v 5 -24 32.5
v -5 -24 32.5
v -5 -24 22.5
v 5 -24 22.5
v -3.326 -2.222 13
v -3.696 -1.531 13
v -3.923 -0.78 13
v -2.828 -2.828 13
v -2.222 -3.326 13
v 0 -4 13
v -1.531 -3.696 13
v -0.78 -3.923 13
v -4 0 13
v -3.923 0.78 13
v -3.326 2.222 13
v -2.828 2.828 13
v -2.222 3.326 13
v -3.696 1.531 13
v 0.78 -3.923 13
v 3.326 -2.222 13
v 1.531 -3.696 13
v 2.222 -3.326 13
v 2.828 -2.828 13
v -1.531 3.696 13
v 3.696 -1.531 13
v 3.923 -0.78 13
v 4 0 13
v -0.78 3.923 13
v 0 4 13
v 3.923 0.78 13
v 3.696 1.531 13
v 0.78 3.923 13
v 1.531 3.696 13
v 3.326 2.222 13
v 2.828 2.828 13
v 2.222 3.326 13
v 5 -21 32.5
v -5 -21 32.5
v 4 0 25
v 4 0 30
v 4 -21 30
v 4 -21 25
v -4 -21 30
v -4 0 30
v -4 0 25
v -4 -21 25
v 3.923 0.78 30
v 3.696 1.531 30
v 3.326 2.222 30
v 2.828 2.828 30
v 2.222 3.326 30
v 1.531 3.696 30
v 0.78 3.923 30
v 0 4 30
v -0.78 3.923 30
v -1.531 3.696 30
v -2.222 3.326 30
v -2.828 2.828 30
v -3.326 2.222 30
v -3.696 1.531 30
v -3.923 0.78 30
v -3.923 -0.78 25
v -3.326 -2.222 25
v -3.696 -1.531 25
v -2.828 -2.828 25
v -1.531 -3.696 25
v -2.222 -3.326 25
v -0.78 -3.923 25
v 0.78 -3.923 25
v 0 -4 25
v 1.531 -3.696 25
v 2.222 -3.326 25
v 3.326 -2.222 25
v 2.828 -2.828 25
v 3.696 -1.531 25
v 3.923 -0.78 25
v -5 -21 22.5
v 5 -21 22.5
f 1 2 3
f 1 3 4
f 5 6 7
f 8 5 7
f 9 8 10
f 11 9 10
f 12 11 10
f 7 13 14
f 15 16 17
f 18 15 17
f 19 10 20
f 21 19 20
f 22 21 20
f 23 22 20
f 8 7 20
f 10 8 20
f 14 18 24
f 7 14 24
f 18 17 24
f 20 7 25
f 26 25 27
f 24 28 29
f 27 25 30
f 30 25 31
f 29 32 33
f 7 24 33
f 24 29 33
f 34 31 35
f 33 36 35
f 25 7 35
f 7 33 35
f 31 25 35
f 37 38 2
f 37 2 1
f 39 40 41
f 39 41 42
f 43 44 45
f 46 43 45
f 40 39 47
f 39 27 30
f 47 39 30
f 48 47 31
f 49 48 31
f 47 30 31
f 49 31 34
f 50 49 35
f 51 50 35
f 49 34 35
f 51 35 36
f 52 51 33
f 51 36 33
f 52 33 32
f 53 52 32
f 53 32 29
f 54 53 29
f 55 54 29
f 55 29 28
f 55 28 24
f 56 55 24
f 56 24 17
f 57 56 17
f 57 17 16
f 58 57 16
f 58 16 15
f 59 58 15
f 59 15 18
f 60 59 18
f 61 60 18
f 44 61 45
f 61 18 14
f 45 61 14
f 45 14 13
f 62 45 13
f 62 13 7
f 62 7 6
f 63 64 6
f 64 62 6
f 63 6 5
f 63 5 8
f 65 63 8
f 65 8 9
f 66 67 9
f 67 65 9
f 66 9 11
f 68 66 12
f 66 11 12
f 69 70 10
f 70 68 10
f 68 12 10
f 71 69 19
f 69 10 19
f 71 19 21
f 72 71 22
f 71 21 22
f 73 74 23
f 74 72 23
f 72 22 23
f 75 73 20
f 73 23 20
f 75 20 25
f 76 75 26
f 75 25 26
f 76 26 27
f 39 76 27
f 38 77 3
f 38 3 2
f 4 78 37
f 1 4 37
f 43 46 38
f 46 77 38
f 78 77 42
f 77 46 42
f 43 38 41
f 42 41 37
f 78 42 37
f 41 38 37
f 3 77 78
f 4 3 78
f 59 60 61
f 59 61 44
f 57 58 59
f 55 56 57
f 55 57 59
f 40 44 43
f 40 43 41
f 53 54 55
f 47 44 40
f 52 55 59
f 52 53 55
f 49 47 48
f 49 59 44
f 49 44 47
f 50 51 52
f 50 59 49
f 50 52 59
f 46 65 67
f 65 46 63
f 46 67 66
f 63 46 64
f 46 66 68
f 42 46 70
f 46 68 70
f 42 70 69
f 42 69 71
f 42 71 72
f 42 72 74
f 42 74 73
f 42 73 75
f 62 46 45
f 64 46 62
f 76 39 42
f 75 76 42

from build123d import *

# Parameters (mm, degrees)
BOSS_EXTRUDE1_START = 13
SKETCH1_R           = 1.9
BOSS_EXTRUDE1_DEPTH = 0.0001
BOSS_EXTRUDE2_START = 13
SKETCH2_R           = 4
BOSS_EXTRUDE2_DEPTH = 17
SKETCH6_W           = 8
SKETCH6_H           = 5
BOSS_EXTRUDE3_DEPTH = 21
SKETCH7_W           = 10
SKETCH7_H           = 10
BOSS_EXTRUDE4_DEPTH = 3


with BuildPart() as part:
    # Sketch1 → Boss-Extrude1 (new body)
    with BuildSketch(Plane.XY.offset(BOSS_EXTRUDE1_START)):
        Circle(SKETCH1_R)
    extrude(amount=BOSS_EXTRUDE1_DEPTH)

    # Sketch2 → Boss-Extrude2 (add)
    with BuildSketch(Plane.XY.offset(BOSS_EXTRUDE2_START)):
        Circle(SKETCH2_R)
    extrude(amount=BOSS_EXTRUDE2_DEPTH)

    # Sketch6 → Boss-Extrude3 (add)
    with BuildSketch(Plane(origin=(0, 0, 0), x_dir=(1, 0, 0), z_dir=(0, 1, 0))):
        with Locations((0, -27.5)):
            Rectangle(SKETCH6_W, SKETCH6_H)
    extrude(amount=-BOSS_EXTRUDE3_DEPTH)

    # Sketch7 → Boss-Extrude4 (add)
    with BuildSketch(Plane.XZ.offset(21)):
        with Locations((0, 27.5)):
            Rectangle(SKETCH7_W, SKETCH7_H)
    extrude(amount=BOSS_EXTRUDE4_DEPTH)


solid = part.part
